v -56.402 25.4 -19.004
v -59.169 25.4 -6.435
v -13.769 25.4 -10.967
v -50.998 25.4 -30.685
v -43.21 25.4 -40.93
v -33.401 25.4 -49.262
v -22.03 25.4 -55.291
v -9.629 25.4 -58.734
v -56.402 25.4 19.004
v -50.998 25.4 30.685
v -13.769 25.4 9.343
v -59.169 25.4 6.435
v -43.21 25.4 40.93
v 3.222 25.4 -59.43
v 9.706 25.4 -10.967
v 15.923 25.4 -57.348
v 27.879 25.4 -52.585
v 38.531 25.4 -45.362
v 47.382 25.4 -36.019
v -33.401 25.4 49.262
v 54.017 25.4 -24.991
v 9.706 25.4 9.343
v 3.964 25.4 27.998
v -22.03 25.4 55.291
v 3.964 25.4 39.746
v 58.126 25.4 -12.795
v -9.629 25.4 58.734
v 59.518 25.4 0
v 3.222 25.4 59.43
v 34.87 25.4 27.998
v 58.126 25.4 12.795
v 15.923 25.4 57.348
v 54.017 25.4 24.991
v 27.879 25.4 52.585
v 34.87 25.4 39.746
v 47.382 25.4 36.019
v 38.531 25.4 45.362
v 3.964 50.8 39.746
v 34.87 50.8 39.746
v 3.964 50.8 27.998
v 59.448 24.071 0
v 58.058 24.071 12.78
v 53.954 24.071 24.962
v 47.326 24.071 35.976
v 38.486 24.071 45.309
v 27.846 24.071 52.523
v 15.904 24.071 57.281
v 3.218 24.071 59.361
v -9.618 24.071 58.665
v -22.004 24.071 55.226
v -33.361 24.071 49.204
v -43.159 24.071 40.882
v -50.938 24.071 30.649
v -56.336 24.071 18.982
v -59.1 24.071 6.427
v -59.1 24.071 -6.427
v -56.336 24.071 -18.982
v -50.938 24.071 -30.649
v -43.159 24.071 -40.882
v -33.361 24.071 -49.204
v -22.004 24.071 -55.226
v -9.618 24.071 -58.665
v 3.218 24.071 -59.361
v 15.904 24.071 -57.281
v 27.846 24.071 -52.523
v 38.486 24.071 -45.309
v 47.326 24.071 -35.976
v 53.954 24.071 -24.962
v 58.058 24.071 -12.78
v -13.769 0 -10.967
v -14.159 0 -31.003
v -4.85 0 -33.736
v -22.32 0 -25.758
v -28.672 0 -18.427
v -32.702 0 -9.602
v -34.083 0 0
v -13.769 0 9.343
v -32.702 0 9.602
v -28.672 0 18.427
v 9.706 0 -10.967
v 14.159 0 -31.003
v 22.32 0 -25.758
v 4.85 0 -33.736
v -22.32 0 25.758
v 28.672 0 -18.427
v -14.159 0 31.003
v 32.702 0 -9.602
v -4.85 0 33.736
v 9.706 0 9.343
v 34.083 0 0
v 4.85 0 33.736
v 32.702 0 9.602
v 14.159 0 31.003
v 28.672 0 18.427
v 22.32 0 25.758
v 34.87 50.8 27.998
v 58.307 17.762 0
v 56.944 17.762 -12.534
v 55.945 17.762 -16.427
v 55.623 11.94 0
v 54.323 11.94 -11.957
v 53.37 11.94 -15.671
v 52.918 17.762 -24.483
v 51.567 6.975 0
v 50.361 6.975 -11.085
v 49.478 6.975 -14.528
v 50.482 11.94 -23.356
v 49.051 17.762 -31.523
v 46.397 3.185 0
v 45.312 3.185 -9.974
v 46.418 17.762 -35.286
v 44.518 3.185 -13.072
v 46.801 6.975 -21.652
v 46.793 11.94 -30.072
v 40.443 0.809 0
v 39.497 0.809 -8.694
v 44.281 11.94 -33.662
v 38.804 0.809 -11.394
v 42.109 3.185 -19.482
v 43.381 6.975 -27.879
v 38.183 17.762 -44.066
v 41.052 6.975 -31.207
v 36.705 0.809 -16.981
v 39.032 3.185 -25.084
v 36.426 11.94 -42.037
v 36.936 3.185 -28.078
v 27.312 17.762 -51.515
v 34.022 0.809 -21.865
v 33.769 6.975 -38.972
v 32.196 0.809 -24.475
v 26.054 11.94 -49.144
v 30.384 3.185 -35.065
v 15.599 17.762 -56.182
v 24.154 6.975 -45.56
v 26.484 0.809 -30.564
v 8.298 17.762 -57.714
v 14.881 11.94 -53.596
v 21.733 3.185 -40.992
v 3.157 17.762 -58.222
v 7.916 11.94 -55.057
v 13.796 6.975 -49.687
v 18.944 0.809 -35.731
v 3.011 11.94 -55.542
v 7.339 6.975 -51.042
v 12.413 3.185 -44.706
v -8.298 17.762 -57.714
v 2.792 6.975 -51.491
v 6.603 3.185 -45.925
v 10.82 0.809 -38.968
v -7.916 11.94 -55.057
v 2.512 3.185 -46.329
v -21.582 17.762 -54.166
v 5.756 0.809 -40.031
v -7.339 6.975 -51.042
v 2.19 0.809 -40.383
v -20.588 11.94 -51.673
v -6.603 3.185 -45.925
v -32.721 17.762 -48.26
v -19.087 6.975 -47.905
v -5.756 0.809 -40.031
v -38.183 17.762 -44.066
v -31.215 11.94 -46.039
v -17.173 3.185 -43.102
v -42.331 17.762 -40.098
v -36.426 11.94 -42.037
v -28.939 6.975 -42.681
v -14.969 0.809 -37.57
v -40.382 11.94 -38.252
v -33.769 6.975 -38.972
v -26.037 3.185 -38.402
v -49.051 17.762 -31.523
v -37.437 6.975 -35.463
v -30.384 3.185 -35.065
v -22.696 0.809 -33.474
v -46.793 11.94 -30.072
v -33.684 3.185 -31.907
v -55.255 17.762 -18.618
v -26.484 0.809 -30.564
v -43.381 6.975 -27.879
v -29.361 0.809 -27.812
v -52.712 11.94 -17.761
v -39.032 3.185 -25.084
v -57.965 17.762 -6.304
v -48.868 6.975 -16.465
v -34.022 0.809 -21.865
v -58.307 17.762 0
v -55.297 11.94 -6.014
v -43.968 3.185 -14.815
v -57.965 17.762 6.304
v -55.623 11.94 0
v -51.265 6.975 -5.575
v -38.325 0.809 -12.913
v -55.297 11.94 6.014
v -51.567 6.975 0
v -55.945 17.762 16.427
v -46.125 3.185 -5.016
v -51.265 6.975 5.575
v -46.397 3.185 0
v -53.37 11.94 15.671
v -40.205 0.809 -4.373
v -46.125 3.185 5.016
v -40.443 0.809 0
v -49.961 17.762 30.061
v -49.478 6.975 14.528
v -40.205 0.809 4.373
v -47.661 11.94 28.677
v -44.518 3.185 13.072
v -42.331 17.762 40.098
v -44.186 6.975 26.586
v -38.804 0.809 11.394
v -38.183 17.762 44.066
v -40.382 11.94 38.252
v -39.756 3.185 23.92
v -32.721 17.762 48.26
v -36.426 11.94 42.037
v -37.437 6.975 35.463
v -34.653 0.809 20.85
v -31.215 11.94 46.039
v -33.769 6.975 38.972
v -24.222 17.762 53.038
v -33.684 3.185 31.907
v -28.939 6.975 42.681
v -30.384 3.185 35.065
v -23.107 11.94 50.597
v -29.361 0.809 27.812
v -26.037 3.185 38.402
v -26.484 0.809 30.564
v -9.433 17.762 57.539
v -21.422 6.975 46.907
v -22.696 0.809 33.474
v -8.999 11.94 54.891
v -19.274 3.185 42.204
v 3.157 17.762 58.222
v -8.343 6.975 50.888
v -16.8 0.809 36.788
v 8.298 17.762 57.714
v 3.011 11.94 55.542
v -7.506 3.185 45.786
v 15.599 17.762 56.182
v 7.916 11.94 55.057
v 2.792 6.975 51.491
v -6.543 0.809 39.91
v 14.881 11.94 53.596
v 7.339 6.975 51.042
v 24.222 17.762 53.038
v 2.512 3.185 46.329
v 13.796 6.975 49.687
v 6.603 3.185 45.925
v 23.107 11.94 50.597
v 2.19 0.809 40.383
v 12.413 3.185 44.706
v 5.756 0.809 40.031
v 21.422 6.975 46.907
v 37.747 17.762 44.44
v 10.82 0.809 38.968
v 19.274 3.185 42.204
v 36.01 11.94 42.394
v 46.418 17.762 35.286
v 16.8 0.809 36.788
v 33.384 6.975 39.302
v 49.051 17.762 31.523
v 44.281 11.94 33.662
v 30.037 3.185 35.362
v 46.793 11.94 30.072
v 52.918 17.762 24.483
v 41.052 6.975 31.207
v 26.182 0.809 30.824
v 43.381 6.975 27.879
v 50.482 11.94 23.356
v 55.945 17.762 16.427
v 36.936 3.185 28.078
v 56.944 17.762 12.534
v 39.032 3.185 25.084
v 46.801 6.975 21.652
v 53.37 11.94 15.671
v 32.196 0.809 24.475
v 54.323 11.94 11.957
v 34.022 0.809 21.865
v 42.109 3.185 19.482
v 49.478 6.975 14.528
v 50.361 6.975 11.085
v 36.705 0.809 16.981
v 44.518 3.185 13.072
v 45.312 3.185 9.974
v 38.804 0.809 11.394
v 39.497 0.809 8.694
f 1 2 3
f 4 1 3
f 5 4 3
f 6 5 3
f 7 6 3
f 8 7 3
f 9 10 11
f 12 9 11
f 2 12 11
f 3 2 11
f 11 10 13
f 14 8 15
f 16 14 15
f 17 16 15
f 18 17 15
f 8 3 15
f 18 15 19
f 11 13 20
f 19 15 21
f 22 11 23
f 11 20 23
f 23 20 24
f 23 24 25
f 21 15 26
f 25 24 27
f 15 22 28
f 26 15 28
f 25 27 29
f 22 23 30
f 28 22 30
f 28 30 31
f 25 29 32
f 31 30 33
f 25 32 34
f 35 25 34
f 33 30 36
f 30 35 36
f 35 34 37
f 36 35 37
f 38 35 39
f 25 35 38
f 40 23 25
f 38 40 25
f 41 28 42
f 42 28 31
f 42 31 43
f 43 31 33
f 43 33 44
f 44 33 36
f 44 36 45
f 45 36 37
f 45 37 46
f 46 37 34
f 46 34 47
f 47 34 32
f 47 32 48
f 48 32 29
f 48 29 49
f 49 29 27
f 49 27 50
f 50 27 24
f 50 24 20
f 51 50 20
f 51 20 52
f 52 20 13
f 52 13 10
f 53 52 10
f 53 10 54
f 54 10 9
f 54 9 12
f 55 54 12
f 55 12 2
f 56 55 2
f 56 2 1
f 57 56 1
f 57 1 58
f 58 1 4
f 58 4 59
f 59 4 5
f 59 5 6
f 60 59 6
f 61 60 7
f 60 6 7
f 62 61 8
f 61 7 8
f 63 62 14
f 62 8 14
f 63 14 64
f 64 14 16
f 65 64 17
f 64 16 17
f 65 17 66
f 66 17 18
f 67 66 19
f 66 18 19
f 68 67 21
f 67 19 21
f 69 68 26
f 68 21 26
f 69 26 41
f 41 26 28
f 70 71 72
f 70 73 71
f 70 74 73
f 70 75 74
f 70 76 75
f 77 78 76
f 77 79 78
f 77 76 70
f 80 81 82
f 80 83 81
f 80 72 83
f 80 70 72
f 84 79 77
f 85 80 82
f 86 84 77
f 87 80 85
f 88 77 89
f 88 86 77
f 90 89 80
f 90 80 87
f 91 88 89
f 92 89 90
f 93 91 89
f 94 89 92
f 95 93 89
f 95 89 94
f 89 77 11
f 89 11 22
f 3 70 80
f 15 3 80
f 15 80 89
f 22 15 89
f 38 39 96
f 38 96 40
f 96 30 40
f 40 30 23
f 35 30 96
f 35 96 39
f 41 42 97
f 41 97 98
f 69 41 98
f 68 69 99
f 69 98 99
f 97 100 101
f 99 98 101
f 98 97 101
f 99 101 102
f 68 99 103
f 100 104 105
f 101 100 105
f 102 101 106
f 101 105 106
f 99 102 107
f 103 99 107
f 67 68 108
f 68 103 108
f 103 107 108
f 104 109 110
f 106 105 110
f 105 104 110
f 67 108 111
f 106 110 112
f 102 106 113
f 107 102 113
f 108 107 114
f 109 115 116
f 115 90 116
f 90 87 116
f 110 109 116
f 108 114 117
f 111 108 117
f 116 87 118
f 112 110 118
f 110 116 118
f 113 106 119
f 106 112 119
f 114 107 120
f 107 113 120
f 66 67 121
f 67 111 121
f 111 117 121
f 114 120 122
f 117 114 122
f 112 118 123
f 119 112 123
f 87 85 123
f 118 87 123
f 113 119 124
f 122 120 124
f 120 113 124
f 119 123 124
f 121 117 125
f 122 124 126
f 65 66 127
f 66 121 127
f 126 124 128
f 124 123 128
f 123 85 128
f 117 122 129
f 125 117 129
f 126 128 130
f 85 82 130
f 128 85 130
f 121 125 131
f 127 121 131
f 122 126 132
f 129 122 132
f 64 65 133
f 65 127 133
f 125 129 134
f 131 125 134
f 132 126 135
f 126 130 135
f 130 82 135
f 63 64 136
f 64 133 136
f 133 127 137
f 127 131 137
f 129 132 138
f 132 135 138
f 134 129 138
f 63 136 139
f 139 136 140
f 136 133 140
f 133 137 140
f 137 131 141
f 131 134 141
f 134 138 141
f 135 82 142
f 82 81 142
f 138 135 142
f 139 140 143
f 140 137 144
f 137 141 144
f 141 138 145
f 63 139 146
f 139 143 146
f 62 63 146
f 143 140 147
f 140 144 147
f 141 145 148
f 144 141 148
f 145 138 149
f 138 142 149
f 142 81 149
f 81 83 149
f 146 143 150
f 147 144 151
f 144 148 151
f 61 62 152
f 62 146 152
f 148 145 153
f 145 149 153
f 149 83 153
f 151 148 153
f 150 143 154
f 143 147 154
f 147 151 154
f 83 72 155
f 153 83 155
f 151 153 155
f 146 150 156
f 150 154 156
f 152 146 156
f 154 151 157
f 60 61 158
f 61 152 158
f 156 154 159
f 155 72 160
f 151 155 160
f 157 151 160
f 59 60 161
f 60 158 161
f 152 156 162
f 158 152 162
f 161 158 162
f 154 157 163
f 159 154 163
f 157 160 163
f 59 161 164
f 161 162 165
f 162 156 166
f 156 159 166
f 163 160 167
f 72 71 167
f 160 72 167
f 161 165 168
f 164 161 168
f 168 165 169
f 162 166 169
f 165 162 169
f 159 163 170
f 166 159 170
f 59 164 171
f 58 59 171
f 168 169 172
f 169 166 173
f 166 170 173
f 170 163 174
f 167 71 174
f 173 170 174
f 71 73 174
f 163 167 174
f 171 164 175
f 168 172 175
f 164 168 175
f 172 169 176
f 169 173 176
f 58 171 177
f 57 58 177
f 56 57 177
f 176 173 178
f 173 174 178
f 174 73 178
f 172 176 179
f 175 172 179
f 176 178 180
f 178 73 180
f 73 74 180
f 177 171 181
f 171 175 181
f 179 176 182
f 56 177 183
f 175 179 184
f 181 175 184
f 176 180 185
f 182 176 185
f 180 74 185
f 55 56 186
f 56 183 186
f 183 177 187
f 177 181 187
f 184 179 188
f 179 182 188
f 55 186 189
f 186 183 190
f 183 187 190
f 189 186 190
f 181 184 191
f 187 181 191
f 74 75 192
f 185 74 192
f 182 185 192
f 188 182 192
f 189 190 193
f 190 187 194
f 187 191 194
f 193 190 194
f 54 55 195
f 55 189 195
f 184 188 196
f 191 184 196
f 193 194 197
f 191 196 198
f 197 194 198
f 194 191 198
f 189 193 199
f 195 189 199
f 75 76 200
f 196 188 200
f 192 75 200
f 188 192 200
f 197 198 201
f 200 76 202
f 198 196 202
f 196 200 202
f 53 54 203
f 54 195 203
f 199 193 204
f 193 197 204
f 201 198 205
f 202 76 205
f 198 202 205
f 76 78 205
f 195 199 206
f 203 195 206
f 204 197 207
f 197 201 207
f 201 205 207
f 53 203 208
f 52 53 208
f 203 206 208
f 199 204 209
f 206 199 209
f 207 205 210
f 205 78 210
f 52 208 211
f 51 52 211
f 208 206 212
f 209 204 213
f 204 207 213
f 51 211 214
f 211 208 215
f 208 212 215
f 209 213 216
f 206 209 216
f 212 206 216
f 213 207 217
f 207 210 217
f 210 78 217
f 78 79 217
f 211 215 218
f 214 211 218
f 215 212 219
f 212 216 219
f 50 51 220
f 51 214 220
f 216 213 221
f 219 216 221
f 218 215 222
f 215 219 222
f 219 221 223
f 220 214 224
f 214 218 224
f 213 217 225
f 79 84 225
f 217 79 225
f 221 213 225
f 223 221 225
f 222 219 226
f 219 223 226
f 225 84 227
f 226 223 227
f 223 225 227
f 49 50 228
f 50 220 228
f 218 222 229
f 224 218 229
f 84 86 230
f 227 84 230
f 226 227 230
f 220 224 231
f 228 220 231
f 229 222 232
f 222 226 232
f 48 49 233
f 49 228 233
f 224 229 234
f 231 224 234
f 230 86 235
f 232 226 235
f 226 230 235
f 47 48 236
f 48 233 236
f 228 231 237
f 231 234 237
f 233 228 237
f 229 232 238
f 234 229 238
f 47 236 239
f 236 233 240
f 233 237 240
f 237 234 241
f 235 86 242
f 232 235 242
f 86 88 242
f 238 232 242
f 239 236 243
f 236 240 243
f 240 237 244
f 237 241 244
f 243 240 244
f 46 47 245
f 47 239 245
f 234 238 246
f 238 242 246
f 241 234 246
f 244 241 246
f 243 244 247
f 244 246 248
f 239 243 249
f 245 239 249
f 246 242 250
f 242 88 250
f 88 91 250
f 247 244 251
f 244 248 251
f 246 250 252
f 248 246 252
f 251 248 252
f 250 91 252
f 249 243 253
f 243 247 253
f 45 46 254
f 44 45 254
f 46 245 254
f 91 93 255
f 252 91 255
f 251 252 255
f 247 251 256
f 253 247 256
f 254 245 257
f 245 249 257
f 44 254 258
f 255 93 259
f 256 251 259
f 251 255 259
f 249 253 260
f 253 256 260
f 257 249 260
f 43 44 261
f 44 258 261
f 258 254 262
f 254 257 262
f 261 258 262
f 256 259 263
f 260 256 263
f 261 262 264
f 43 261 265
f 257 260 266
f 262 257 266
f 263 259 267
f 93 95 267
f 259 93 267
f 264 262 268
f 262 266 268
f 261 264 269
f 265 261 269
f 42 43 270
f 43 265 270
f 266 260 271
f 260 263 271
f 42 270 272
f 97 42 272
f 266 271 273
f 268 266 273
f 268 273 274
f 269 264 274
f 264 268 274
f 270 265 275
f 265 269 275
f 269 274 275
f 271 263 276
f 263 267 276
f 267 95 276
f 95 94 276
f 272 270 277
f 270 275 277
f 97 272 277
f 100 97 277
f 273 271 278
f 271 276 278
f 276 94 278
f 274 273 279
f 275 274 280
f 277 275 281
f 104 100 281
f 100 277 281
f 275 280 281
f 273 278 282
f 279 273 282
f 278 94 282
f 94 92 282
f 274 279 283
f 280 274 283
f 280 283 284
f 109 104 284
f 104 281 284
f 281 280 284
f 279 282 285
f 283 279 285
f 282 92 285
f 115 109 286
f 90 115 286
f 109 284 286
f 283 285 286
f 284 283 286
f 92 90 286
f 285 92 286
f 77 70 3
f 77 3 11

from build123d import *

# Parameters (mm, degrees)
F0_R     = 58.1865618052
F1_DEPTH = 25.4
F1_TAPER = -3
F2_W     = 23.4757708386
F2_H     = 20.3105555847
F3_DEPTH = 25.4
F4_R     = 25.4
F5_W     = 30.9055270627
F5_H     = 11.7483213544
F6_DEPTH = 25.4


with BuildPart() as f1:
    # F0 (on Front) → F1 (new body)
    with BuildSketch(Plane.XZ):
        Circle(F0_R)
    extrude(amount=-F1_DEPTH, taper=F1_TAPER)

    # F2 (on face) → F3 (cut, through all)
    with BuildSketch(Plane.XZ):
        with Locations((-2.031555865, -0.8121863939)):
            Rectangle(F2_W, F2_H)
    extrude(amount=-F3_DEPTH, mode=Mode.SUBTRACT)

    # F4
    f4_edges = [f1.edges().sort_by_distance(p)[0] for p in [
        (-58.186562, 0, 0),
    ]]
    fillet(f4_edges, radius=F4_R)

    # F5 (on face) → F6 (join)
    with BuildSketch(Plane(origin=(0, 25.4, 0), x_dir=(-1, 0, 0), z_dir=(0, 1, 0))):
        with Locations((-19.417067524, 33.8719151914)):
            Rectangle(F5_W, F5_H)
    extrude(amount=F6_DEPTH)


solid = f1.part
